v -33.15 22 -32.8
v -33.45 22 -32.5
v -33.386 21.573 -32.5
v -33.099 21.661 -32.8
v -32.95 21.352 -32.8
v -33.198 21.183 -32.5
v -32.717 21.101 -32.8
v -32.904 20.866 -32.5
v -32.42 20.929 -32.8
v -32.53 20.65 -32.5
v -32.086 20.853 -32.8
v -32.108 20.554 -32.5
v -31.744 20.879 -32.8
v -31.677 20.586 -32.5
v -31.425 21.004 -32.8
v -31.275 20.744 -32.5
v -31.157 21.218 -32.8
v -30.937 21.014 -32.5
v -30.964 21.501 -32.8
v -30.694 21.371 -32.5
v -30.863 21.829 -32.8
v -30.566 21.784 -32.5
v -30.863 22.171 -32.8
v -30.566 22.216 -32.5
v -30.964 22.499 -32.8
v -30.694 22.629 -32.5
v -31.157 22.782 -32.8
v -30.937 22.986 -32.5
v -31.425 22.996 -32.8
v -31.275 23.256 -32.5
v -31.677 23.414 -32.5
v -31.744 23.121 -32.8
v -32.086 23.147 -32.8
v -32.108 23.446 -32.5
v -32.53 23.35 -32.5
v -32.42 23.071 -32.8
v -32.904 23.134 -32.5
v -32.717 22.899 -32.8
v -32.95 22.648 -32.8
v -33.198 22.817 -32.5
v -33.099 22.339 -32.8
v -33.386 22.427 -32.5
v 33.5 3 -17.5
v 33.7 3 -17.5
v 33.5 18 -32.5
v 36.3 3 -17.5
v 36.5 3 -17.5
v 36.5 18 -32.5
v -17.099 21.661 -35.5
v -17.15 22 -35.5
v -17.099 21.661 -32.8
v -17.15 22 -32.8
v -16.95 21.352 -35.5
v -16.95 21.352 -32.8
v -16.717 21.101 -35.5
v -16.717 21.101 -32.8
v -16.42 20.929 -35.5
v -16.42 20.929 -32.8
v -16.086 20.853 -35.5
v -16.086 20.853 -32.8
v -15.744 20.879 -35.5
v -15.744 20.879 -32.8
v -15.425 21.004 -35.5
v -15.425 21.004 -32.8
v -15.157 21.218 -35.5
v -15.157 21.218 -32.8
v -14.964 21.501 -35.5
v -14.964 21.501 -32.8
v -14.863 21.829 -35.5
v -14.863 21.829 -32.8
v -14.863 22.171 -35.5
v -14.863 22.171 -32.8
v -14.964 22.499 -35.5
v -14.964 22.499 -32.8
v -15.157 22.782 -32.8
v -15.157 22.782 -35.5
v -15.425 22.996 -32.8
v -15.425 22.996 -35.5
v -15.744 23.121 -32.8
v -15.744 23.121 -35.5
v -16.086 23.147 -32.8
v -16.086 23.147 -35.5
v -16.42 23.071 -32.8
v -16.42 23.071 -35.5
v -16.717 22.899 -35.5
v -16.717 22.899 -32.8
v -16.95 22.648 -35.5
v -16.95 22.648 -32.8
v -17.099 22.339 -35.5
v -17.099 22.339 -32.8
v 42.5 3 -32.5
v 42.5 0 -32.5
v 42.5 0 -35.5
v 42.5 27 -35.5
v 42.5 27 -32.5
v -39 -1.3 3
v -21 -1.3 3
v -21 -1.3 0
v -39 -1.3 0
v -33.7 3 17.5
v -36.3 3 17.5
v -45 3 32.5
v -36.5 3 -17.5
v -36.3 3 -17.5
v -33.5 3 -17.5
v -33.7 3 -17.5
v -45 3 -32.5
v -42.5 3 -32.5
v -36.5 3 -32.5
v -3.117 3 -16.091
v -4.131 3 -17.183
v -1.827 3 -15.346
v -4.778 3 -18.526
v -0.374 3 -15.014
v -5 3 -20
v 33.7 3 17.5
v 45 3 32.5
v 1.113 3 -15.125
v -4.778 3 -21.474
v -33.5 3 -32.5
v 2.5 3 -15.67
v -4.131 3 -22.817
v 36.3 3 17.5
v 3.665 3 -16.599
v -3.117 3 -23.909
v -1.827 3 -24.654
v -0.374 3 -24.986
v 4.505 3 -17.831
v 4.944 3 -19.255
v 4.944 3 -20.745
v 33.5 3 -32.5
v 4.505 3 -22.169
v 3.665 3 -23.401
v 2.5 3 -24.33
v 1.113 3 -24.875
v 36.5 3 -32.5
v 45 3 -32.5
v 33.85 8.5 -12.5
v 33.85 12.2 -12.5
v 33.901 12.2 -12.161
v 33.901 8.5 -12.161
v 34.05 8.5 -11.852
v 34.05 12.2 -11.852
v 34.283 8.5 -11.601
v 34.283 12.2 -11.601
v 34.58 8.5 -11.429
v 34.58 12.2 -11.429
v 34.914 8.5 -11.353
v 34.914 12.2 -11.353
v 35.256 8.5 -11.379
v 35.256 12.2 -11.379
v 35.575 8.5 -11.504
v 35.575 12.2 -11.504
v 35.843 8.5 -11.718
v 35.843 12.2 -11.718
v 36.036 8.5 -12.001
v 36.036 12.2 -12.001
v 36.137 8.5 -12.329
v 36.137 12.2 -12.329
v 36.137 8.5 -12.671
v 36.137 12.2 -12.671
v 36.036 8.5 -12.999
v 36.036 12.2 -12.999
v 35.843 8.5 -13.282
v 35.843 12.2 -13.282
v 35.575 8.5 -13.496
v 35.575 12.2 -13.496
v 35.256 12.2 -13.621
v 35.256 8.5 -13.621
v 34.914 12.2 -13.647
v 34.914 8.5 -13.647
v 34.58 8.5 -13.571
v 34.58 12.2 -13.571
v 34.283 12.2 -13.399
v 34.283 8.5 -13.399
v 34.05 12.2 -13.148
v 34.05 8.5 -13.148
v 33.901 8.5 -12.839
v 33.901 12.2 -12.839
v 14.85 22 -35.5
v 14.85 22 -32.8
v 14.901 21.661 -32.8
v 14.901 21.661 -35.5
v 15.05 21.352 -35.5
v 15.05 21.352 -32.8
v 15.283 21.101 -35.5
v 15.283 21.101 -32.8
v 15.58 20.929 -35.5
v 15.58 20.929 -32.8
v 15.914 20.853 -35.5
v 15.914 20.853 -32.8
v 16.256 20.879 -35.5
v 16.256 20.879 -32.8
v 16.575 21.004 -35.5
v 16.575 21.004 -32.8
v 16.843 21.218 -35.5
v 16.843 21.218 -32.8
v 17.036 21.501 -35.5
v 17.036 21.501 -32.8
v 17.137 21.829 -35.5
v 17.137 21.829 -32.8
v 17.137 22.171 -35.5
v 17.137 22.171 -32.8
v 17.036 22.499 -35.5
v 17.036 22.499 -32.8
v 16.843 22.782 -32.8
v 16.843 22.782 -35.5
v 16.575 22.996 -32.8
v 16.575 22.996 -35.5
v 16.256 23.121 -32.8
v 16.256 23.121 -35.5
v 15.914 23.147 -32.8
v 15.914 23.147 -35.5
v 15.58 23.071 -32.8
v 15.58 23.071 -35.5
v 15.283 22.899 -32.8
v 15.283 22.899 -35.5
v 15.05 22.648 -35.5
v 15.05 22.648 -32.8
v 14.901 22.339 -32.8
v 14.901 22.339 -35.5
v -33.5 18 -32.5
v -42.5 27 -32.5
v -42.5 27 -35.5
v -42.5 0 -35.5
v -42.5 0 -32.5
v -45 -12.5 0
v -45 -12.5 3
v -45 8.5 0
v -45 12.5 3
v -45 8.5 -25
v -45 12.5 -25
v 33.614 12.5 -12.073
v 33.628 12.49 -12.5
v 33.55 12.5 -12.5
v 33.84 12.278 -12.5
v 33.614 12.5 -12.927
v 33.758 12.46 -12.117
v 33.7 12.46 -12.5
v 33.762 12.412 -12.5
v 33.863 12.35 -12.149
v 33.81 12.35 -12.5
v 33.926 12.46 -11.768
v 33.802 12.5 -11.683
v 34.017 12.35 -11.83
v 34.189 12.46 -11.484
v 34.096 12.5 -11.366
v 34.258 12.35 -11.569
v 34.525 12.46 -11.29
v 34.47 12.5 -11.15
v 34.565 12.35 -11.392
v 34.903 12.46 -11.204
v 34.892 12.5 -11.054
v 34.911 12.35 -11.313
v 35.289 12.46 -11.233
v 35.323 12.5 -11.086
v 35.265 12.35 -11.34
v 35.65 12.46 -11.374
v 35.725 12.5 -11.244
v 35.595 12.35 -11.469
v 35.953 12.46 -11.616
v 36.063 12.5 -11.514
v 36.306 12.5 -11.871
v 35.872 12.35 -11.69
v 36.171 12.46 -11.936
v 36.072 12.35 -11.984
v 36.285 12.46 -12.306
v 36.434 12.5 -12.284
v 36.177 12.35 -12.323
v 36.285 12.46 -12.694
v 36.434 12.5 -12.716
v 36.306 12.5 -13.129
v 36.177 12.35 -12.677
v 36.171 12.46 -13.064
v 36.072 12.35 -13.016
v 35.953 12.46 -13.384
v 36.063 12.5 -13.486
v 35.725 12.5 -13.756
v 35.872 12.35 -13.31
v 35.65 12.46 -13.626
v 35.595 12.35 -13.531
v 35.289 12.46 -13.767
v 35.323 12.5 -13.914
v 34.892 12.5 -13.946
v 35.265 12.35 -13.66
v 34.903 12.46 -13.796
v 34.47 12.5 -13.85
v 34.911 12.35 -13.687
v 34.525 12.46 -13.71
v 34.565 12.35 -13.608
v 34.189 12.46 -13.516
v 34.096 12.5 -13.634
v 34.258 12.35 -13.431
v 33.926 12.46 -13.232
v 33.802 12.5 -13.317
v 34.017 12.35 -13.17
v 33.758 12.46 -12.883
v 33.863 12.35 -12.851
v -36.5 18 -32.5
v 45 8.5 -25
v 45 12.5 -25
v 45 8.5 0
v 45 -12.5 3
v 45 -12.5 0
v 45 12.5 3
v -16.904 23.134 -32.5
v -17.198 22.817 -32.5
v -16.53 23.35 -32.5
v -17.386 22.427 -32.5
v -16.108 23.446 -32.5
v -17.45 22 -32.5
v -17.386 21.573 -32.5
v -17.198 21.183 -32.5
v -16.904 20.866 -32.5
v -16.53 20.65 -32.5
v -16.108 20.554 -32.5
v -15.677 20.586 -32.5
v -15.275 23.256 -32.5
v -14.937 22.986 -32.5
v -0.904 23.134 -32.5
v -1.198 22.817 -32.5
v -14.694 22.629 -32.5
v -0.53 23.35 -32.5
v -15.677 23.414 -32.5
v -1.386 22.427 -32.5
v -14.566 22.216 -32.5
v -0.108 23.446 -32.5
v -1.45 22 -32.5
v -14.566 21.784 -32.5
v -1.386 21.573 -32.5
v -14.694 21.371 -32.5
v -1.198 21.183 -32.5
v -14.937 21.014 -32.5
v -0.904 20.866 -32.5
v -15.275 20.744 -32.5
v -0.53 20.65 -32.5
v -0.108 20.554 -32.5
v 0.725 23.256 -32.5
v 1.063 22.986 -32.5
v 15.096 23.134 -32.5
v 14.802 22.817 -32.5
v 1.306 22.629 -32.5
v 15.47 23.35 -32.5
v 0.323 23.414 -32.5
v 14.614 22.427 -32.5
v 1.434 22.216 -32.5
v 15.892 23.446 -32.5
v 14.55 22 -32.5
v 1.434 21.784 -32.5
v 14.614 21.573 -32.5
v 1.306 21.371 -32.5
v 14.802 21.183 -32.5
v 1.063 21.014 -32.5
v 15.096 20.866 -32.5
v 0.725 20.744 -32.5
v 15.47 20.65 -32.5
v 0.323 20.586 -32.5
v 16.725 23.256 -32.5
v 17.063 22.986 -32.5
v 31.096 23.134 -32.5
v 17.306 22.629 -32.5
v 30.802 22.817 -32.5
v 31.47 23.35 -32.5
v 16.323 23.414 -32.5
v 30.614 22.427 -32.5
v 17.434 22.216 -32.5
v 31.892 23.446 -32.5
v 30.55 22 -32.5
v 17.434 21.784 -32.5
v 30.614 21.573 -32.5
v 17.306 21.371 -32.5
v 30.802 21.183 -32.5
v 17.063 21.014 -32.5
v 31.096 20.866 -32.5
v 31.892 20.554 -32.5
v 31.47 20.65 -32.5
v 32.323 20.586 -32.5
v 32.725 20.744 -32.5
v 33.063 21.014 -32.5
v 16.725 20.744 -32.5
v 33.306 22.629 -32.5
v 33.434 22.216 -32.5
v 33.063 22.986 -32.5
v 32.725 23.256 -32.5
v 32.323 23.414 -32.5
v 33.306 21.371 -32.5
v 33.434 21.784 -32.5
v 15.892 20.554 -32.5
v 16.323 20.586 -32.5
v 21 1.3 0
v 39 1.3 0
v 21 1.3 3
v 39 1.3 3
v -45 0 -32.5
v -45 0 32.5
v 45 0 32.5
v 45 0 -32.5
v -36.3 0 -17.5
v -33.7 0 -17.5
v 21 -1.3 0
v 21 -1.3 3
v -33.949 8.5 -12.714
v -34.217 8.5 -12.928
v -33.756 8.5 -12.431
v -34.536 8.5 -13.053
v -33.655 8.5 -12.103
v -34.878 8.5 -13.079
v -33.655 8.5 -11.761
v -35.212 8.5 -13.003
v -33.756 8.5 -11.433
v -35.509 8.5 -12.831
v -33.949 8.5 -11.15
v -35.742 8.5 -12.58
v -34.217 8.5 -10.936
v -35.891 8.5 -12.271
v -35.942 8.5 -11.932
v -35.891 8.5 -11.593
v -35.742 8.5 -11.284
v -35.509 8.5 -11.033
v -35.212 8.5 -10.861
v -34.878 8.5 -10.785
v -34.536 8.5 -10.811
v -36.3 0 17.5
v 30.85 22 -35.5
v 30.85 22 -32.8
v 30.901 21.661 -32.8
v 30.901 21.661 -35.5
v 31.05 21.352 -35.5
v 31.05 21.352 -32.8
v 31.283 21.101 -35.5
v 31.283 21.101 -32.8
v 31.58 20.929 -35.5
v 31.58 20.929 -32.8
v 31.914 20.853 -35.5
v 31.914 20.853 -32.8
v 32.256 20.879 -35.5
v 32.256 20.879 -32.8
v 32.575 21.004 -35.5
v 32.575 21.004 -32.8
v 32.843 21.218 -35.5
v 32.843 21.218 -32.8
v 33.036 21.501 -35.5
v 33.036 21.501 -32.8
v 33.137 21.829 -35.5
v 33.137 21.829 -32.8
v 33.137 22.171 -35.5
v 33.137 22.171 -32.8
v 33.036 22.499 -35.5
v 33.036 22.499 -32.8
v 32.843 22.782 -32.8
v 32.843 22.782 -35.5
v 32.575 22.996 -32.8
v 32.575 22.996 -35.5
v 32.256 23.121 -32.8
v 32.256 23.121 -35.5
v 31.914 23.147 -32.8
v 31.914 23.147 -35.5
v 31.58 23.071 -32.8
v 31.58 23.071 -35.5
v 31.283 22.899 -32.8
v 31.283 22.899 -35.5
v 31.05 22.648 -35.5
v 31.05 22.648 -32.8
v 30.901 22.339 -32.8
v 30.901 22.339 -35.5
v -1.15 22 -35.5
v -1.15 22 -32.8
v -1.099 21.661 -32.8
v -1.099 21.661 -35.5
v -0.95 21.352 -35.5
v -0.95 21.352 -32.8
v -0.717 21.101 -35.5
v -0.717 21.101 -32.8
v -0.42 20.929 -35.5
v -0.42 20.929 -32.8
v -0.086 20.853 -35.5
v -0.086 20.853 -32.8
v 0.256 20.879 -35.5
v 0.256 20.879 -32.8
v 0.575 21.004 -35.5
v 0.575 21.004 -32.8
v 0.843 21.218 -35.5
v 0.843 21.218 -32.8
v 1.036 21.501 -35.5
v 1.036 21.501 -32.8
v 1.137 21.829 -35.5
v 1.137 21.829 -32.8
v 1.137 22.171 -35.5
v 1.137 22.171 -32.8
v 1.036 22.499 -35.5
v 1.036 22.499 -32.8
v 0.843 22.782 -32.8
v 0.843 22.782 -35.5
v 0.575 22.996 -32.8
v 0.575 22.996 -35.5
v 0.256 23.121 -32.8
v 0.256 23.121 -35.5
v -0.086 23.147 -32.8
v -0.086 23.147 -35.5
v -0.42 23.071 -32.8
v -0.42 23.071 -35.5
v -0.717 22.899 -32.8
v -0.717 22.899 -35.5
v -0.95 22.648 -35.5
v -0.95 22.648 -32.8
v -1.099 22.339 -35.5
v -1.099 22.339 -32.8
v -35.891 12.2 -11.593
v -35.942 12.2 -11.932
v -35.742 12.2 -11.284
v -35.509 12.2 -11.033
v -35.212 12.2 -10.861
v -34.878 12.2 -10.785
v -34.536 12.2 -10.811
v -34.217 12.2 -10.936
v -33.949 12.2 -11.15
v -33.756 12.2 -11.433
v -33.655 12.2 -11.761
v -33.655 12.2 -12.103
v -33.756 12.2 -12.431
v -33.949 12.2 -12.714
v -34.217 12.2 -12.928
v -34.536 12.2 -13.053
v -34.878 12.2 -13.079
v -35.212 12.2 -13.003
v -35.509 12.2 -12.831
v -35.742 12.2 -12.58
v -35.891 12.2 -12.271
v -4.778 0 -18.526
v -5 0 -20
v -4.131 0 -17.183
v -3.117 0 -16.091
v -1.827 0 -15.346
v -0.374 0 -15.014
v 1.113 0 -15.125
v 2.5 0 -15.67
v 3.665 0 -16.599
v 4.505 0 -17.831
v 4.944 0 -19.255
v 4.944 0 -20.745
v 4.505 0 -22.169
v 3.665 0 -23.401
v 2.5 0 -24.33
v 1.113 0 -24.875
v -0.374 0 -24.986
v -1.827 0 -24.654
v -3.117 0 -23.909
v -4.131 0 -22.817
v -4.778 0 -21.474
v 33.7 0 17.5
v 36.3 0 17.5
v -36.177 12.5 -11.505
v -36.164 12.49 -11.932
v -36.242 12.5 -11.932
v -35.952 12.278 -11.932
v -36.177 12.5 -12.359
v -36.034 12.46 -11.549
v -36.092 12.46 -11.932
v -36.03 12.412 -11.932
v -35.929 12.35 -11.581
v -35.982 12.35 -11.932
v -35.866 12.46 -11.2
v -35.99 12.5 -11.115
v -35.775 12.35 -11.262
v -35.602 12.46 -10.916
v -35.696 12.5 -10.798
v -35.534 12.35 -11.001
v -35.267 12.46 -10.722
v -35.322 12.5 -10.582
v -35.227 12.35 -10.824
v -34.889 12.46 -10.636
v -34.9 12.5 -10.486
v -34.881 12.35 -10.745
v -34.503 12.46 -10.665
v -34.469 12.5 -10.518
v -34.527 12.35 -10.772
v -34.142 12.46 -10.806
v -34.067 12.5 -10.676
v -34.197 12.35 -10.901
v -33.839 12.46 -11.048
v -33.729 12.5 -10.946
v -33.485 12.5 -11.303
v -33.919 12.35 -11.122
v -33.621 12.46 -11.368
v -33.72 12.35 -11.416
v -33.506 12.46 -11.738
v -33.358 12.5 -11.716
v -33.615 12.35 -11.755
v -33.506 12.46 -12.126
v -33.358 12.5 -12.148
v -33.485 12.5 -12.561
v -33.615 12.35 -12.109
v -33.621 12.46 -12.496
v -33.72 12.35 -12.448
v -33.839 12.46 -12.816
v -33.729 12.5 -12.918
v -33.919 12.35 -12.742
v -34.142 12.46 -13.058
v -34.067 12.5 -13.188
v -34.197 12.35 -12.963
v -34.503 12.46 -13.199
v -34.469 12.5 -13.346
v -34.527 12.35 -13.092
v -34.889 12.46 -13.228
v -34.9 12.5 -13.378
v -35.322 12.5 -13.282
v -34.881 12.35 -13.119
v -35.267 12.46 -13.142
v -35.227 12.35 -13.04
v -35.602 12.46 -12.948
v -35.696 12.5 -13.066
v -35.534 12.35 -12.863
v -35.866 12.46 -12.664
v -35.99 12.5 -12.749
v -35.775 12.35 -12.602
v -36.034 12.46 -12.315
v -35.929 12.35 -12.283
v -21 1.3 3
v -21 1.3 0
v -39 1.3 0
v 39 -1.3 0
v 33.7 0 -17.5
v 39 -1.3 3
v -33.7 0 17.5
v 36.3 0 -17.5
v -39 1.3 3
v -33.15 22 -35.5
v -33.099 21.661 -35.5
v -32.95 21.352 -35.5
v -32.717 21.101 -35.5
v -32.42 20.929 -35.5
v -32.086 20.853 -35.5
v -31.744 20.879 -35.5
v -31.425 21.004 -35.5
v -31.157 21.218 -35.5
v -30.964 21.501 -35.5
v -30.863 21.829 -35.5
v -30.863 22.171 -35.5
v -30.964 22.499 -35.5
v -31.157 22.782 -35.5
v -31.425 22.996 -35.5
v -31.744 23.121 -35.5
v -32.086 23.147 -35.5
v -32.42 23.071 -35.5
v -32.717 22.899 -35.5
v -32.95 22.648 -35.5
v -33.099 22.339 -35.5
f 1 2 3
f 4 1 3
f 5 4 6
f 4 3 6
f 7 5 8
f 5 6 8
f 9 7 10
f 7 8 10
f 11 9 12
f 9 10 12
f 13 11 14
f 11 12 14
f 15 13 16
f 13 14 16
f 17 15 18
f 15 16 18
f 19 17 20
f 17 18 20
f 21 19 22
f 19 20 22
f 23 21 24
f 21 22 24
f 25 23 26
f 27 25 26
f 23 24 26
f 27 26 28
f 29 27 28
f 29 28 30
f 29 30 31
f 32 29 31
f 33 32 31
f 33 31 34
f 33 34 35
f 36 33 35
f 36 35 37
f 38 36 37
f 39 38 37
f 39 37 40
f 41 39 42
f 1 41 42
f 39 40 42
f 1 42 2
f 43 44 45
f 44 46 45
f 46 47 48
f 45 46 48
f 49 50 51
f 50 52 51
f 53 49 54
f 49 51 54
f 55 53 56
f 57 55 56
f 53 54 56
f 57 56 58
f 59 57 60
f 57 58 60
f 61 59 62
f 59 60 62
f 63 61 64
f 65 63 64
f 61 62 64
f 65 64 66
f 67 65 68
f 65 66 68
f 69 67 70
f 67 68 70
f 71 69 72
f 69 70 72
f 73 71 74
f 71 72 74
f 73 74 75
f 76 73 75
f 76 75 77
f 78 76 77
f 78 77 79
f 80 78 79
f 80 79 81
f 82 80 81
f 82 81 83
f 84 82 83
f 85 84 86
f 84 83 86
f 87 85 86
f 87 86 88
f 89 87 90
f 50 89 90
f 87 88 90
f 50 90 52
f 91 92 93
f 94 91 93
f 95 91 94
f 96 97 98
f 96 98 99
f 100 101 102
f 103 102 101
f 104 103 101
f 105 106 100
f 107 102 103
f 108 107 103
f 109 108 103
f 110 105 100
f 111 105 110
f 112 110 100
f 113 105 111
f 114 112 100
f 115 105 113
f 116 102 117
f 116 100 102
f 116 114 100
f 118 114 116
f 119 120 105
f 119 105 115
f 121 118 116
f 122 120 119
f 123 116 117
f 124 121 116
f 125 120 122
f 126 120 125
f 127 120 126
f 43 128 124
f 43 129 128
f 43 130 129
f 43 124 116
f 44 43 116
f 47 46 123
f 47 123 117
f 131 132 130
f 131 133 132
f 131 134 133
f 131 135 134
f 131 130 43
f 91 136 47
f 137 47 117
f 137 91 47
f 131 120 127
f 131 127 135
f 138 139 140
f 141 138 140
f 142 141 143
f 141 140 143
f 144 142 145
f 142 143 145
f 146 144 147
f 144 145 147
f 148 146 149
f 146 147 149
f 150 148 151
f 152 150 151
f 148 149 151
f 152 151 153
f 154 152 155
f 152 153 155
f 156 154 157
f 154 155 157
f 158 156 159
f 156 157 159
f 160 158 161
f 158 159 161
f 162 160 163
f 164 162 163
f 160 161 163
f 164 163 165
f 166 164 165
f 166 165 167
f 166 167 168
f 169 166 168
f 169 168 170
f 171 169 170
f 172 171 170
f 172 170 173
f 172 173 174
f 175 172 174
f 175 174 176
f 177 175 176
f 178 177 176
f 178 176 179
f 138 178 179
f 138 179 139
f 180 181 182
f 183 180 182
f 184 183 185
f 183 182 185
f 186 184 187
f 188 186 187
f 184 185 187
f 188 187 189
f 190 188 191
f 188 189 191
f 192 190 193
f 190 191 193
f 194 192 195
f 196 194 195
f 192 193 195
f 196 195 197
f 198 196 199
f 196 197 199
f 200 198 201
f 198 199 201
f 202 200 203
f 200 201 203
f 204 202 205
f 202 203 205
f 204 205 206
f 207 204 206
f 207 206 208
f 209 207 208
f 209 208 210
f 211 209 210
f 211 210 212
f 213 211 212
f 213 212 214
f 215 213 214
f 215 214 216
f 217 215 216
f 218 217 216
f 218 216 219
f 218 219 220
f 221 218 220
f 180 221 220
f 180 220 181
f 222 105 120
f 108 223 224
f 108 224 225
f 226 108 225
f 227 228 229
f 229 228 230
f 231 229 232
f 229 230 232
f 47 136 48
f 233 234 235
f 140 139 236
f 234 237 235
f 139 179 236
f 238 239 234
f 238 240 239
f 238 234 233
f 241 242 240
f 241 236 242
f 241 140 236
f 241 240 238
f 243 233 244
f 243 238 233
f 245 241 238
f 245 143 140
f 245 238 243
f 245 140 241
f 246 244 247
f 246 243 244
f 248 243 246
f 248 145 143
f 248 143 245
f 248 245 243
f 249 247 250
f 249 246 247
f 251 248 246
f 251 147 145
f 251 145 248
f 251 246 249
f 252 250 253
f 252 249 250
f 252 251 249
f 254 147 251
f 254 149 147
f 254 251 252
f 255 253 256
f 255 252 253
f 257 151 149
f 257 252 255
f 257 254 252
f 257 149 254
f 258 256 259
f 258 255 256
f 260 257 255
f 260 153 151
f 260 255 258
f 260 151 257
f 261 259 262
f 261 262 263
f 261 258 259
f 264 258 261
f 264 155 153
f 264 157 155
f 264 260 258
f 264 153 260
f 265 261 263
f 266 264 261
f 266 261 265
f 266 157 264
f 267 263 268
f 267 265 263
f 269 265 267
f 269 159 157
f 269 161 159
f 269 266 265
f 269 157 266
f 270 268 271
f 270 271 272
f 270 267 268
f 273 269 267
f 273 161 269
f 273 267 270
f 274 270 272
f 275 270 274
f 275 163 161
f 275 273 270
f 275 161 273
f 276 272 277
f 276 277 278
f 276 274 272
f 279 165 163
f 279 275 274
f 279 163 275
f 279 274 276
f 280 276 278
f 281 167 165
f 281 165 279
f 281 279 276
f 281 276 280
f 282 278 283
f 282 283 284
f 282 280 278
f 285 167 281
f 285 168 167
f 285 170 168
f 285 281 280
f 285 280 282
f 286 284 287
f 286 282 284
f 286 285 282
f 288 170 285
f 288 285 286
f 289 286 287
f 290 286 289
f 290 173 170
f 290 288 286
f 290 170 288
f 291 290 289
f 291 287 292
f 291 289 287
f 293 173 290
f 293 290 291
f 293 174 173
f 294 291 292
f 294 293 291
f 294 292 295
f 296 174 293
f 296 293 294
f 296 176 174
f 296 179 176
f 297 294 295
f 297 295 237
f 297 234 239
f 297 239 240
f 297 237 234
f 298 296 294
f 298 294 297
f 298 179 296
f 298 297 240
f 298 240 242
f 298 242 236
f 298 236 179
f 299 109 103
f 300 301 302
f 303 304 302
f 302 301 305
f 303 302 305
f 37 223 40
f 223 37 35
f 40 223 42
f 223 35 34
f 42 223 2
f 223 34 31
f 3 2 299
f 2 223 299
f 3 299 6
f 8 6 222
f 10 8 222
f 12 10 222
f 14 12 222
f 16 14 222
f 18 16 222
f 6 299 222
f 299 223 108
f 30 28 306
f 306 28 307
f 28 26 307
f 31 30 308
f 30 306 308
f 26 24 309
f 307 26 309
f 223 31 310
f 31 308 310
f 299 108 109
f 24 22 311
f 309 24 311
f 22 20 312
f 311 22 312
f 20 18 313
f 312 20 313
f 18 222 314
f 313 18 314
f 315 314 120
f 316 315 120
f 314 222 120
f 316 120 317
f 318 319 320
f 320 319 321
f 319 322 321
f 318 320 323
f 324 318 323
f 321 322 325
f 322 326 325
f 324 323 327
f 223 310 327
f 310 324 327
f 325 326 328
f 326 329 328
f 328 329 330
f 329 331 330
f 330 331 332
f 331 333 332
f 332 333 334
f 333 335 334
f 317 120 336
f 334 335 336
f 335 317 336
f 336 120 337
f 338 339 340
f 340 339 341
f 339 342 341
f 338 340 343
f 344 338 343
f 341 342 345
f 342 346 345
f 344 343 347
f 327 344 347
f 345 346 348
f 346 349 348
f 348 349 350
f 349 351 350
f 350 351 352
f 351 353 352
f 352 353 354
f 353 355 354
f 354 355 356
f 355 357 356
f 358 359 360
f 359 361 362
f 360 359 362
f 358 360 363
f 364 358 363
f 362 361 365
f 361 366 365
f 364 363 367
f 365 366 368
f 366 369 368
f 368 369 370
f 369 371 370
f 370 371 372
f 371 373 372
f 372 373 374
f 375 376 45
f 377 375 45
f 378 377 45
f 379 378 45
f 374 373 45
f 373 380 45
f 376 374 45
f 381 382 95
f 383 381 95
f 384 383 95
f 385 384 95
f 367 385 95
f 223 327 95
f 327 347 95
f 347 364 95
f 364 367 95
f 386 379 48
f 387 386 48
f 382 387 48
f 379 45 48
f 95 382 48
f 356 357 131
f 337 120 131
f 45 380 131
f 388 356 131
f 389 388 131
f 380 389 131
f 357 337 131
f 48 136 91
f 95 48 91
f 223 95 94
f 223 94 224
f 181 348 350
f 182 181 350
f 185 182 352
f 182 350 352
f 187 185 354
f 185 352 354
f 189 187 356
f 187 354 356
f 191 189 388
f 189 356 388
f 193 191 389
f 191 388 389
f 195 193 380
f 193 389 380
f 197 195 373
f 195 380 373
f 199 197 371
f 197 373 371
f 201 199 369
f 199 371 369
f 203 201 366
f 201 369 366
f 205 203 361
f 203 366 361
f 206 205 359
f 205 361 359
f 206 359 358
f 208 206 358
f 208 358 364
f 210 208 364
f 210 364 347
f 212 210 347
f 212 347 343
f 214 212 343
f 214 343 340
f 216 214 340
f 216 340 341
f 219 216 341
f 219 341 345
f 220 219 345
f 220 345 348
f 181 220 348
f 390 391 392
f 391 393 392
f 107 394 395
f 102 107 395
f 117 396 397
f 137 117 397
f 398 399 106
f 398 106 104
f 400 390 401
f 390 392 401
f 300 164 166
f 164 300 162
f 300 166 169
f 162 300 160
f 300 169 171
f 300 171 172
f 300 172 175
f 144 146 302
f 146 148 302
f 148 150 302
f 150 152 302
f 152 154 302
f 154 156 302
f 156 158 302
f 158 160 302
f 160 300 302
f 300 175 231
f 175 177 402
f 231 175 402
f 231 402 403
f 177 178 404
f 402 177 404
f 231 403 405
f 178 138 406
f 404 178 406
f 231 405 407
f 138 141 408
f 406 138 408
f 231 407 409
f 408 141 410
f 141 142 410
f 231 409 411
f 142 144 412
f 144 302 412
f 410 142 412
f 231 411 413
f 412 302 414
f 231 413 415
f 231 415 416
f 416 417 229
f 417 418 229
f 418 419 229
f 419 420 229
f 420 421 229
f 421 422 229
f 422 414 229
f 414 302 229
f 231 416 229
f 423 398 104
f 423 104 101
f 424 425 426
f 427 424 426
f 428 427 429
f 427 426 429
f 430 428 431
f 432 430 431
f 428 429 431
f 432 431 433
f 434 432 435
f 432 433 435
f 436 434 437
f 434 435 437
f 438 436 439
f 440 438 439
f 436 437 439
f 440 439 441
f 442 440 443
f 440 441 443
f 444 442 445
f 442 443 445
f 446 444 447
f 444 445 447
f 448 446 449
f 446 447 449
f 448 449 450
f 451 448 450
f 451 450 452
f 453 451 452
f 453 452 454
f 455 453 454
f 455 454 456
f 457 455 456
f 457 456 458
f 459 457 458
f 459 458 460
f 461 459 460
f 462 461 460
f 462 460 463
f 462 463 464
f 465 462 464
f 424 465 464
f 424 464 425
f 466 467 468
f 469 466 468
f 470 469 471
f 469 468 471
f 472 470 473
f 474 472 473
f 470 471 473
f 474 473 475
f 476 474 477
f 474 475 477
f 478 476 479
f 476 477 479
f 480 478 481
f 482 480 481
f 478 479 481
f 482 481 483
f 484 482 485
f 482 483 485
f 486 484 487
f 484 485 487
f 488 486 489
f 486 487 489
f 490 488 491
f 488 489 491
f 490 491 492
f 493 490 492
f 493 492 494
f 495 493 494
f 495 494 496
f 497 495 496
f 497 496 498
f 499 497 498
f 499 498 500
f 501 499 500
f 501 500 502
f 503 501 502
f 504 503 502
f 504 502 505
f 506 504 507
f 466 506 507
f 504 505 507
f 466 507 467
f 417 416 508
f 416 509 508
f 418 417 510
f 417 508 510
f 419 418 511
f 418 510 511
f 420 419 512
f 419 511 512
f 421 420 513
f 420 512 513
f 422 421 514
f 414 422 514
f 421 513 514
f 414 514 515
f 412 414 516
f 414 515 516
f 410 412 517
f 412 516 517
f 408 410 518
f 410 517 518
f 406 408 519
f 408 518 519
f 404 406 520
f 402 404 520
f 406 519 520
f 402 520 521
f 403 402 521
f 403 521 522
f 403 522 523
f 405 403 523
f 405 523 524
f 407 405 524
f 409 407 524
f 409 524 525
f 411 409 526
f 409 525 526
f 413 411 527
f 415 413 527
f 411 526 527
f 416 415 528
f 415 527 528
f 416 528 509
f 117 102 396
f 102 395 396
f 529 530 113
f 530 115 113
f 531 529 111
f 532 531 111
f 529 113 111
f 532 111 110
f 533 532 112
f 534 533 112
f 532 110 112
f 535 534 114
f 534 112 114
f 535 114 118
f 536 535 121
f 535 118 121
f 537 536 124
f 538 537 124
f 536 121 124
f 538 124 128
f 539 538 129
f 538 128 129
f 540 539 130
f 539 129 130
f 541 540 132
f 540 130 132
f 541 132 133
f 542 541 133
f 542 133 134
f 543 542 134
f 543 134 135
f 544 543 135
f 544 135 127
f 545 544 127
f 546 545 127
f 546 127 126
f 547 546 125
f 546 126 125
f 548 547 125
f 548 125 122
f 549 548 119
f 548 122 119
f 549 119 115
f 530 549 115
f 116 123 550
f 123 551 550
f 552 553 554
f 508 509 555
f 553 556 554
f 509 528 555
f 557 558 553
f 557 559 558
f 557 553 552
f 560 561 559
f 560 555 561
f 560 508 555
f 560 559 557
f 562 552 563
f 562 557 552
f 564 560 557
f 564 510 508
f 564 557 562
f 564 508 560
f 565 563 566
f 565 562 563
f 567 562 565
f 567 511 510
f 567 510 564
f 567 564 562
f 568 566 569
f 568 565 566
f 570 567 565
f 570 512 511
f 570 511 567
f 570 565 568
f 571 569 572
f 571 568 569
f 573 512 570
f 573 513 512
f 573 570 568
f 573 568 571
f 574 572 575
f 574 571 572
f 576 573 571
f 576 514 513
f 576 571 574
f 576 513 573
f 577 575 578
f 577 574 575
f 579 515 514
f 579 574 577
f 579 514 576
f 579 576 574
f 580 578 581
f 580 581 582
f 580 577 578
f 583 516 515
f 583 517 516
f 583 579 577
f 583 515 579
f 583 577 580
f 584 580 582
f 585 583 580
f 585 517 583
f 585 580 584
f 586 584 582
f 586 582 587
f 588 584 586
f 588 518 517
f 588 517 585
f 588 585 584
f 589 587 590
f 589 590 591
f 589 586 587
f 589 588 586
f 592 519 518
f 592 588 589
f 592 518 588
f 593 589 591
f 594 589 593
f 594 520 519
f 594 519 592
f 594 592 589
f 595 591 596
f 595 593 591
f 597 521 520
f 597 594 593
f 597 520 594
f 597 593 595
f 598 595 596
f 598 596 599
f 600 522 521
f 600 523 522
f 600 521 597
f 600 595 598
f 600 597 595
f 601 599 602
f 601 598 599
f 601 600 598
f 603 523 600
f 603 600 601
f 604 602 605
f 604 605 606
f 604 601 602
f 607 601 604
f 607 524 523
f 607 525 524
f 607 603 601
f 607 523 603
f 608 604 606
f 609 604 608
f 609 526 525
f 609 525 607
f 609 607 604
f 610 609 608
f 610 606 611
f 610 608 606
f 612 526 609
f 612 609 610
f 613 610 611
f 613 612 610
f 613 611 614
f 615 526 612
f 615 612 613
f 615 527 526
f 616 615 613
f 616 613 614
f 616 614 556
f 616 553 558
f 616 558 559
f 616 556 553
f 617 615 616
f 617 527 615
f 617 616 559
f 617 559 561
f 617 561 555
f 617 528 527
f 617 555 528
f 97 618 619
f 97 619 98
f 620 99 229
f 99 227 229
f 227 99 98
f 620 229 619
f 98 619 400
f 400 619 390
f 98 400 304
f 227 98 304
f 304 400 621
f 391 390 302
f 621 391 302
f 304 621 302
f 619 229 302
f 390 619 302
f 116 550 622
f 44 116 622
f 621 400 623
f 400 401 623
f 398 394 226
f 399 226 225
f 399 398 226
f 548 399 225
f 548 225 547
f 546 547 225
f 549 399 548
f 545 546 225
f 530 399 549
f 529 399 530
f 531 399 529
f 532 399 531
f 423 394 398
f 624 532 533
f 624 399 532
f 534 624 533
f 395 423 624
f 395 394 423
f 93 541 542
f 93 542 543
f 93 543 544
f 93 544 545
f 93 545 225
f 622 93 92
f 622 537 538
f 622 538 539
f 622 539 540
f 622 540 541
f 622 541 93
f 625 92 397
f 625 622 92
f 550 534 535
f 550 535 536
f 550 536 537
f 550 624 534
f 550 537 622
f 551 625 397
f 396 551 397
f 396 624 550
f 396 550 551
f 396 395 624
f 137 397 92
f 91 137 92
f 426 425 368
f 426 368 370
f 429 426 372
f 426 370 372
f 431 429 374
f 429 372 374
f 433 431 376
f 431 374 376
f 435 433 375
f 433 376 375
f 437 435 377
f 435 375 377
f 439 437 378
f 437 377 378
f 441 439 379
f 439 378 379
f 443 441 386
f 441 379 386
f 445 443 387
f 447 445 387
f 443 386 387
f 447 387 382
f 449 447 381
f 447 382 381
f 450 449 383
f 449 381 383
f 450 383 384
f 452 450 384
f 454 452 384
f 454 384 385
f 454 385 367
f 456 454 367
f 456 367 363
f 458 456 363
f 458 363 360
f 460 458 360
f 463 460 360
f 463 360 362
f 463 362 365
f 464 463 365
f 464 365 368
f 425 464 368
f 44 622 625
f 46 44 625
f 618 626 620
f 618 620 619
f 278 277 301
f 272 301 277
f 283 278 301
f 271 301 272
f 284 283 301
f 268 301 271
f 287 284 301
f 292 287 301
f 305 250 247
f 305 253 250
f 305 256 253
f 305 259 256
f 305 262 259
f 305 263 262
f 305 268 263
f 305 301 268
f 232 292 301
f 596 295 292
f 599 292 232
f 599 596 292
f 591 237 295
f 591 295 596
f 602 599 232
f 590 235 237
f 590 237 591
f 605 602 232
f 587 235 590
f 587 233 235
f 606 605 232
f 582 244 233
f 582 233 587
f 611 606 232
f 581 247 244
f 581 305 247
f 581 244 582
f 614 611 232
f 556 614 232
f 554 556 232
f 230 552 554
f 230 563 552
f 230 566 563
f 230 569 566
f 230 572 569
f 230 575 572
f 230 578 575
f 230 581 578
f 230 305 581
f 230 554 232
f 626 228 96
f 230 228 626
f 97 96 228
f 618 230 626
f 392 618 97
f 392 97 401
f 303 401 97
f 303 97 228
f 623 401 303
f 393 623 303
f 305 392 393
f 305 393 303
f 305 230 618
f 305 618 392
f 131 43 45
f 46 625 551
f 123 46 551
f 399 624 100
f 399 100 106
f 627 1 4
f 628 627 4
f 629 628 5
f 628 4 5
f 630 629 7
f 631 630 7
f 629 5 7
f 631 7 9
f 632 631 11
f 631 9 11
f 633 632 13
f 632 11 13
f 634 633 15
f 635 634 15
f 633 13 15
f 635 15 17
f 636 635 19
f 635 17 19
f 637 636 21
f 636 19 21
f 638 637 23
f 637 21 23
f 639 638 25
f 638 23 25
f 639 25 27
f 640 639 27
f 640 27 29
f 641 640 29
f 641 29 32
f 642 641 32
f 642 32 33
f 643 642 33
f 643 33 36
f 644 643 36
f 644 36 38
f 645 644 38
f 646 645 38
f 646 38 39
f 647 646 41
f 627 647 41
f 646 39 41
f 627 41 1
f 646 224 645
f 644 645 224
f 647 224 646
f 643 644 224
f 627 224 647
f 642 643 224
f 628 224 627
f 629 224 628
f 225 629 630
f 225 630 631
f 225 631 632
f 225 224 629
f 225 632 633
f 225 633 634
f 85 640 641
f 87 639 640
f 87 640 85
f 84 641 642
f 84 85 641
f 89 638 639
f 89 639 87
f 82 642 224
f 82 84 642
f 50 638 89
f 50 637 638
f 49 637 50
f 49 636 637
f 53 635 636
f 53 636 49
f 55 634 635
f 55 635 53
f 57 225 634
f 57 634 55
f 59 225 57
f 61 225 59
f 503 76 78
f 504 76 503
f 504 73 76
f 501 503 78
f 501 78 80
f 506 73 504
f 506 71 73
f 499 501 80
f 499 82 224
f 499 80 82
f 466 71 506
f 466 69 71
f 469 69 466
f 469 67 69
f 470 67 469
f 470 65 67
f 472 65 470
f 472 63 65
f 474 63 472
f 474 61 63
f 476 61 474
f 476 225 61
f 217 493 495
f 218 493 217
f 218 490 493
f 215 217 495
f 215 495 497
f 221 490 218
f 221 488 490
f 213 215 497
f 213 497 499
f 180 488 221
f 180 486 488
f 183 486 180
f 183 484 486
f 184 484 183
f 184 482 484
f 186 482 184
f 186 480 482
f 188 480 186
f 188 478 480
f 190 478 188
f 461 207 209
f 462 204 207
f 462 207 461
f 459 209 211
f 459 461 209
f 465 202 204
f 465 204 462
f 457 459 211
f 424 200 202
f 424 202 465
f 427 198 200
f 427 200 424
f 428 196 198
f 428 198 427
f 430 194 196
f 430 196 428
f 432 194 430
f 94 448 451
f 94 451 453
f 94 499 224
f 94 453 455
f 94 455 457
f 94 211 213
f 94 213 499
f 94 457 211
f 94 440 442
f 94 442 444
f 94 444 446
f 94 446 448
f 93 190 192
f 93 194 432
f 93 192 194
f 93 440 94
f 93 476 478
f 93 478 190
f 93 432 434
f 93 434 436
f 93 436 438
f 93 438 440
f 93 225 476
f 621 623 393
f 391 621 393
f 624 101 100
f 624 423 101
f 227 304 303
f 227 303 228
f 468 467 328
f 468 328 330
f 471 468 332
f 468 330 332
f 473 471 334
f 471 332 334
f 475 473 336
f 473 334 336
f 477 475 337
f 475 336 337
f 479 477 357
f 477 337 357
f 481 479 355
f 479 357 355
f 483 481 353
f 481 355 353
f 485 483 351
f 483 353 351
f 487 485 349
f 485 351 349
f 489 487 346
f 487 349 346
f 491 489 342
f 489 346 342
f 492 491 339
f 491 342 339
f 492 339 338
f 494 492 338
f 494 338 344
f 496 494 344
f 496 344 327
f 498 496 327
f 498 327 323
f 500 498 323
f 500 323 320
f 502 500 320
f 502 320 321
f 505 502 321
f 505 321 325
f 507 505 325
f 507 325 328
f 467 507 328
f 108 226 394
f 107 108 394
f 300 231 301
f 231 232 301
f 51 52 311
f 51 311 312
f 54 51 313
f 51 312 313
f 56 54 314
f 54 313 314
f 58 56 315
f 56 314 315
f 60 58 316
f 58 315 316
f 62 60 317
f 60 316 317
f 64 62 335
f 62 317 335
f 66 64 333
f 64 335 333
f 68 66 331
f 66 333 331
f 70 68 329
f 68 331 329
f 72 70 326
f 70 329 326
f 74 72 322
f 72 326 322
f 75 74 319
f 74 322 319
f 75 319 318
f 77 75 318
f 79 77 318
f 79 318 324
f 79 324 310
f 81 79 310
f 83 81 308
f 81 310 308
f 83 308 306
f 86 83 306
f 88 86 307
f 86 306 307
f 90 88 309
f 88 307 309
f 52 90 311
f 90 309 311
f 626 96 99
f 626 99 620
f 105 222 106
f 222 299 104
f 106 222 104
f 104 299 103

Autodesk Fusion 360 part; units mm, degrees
sketch "Sketch1" plane through (0, 0, 0) normal (0, 0, 1) x (1, 0, 0) in component "TCRT_Chassis_Adapter"
  line L0 (-45, 12.5) -> (45, 12.5)
  line L1 (45, 12.5) -> (45, -12.5)
  line L2 (45, -12.5) -> (-45, -12.5)
  line L3 (-45, -12.5) -> (-45, 12.5)
  line L4 (-45, 12.5) -> (45, -12.5) construction
  line L5 (45, 12.5) -> (-45, -12.5) construction
  dimension "d18" = 90
  dimension "d19" = 25
extrude "Extrude1" add sketch "Sketch1" along normal blind 3 makes body 1 in component "TCRT_Chassis_Adapter"
sketch "Sketch2" plane through (0, 0, 3) normal (0, 0, 1) x (-1, 0, 0) in component "TCRT_Chassis_Adapter"
  line L0 (45, 12.5) -> (-45, 12.5)
  line L1 (-45, 12.5) -> (-45, -12.5)
  line L2 (-45, -12.5) -> (45, -12.5)
  line L3 (45, -12.5) -> (45, 12.5)
  line L4 (21, 1.3) -> (39, 1.3)
  line L5 (39, 1.3) -> (39, -1.3)
  line L6 (39, -1.3) -> (21, -1.3)
  line L7 (21, -1.3) -> (21, 1.3)
  line L8 (21, 1.3) -> (39, -1.3) construction
  line L9 (39, 1.3) -> (21, -1.3) construction
  line L10 (0, -12.5) -> (0, 12.5)
  line L11 (-39, -1.3) -> (-21, -1.3)
  line L12 (-39, 1.3) -> (-21, -1.3) construction
  line L13 (-21, -1.3) -> (-21, 1.3)
  line L14 (-21, 1.3) -> (-39, -1.3) construction
  line L15 (-21, 1.3) -> (-39, 1.3)
  line L16 (-39, 1.3) -> (-39, -1.3)
  point P0 (30, 0)
  point P1 (-30, 0)
  dimension "d22" = 18
  dimension "d23" = 30
  dimension "d24" = 2.6
extrude "Extrude2" cut sketch "Sketch2" against normal blind 8 contours L4 L5 L6 L7 | L11 L13 L15 L16 bodies 1 in component "TCRT_Chassis_Adapter"
sketch "Sketch3" plane through (0, 12.5, 0) normal (0, 1, 0) x (-1, 0, 0) in component "TCRT_Chassis_Adapter"
  line L0 (-45, 0) -> (45, 0)
  line L1 (45, 0) -> (45, 3)
  line L2 (45, 3) -> (-45, 3)
  line L3 (-45, 3) -> (-45, 0)
  line L4 (-45, 0) -> (45, 0)
  line L5 (45, 0) -> (45, -25)
  line L6 (45, -25) -> (-45, -25)
  line L7 (-45, -25) -> (-45, 0)
extrude "Extrude3" add sketch "Sketch3" against normal blind 4 contours L0 L4 L5 L6 L7 bodies 1 in component "TCRT_Chassis_Adapter"
sketch "Sketch4" plane through (0, 12.5, 0) normal (0, 1, 0) x (-1, 0, 0) in component "TCRT_Chassis_Adapter"
  line L0 (45, -25) -> (45, 3)
  line L1 (45, 3) -> (-45, 3)
  line L2 (-45, 3) -> (-45, -25)
  line L3 (-45, -25) -> (45, -25)
  circle A0 centre (-35, -12.5) radius 1.15
  line L4 (-0.2279, 3) -> (0, -25)
  circle A1 centre (34.7919, -11.932) radius 1.15
  dimension "d29" = 2.3
  dimension "d31" = 15.5
sketch "Sketch1 (2)" plane through (0, 0, 0) normal (0, 1, 0) x (1, 0, 0) in component "TCRT_Sensor_Slider"
  line L0 (45, 32.5) -> (-45, 32.5)
  line L1 (-45, 32.5) -> (-45, -32.5)
  line L2 (-45, -32.5) -> (45, -32.5)
  line L3 (45, -32.5) -> (45, 32.5)
  line L4 (45, 32.5) -> (-45, -32.5) construction
  line L5 (-45, 32.5) -> (45, -32.5) construction
  dimension "d41" = 65
  dimension "d42" = 90
extrude "Extrude1'" add sketch "Sketch1 (2)" along normal blind 3 separate body makes body 2 in component "TCRT_Sensor_Slider"
sketch "Sketch2 (2)" plane through (0, 0, 0) normal (0, -1, 0) x (1, 0, 0) in component "TCRT_Sensor_Slider"
  line L0 (45, -32.5) -> (45, 32.5)
  line L1 (45, 32.5) -> (-45, 32.5)
  line L2 (-45, 32.5) -> (-45, -32.5)
  line L3 (-45, -32.5) -> (45, -32.5)
  line L4 (0, 32.5) -> (0, -32.5)
  line L5 (-33.7, -17.5001) -> (-36.3, -17.5001)
  line L6 (-36.3, -17.5001) -> (-36.3, 17.4999)
  line L7 (-36.3, 17.4999) -> (-33.7, 17.4999)
  line L8 (-33.7, 17.4999) -> (-33.7, -17.5001)
  line L9 (-33.7, -17.5001) -> (-36.3, 17.4999) construction
  line L10 (-36.3, -17.5001) -> (-33.7, 17.4999) construction
  line L11 (36.3, -17.5001) -> (33.7, 17.4999) construction
  line L12 (33.7, 17.4999) -> (33.7, -17.5001)
  line L13 (33.7, -17.5001) -> (36.3, -17.5001)
  line L14 (36.3, 17.4999) -> (33.7, 17.4999)
  line L15 (33.7, -17.5001) -> (36.3, 17.4999) construction
  line L16 (36.3, -17.5001) -> (36.3, 17.4999)
  point P0 (-35, -0.0001)
  point P1 (35, -0.0001)
  dimension "d45" = 35
  dimension "d46" = 2.6
  dimension "d47" = 35
extrude "Extrude2'" cut sketch "Sketch2 (2)" against normal blind 3 contours L5 L6 L7 L8 | L12 L13 L14 L16 bodies 2 in component "TCRT_Sensor_Slider"
sketch "Sketch3 (2)" plane through (0, 0, 0) normal (1, 0, 0) x (0, 1, 0) in component "TCRT_Sensor_Slider"
sketch "Sketch4 (2)" plane through (0, 0, -32.5) normal (0, 0, -1) x (1, 0, 0) in component "TCRT_Sensor_Slider"
  line L0 (45, 0) -> (-45, 0)
  line L1 (-45, 0) -> (-45, -3)
  line L2 (-45, -3) -> (45, -3)
  line L3 (45, -3) -> (45, 0)
sketch "Sketch5" plane through (0, 0, -32.5) normal (0, 0, -1) x (1, 0, 0) in component "TCRT_Sensor_Slider"
  line L0 (-42.5, 0) -> (42.5, 0)
  line L1 (42.5, 0) -> (42.5, -27)
  line L2 (42.5, -27) -> (-42.5, -27)
  line L3 (-42.5, -27) -> (-42.5, 0)
  dimension "d50" = 42.5
  dimension "d51" = 42.5
  dimension "d52" = 27
extrude "Extrude3'" add sketch "Sketch5" along normal blind 3 bodies 2 in component "TCRT_Sensor_Slider"
sketch "Sketch6" plane through (0, 3, 0) normal (0, 1, 0) x (-1, 0, 0) in component "TCRT_Sensor_Slider"
  line L0 (36.3, 17.4999) -> (36.3, -17.5001)
  line L1 (36.3, -17.5001) -> (33.7, -17.5001)
  line L2 (33.7, -17.5001) -> (33.7, 17.4999)
  line L3 (33.7, 17.4999) -> (36.3, 17.4999)
  line L4 (-36.3, 17.4999) -> (-33.7, 17.4999)
  line L5 (-33.7, 17.4999) -> (-33.7, -17.5001)
  line L6 (-33.7, -17.5001) -> (-36.3, -17.5001)
  line L7 (-36.3, -17.5001) -> (-36.3, 17.4999)
  line L8 (-45, 32.5) -> (-45, -32.5)
  line L9 (-45, -32.5) -> (-42.5, -32.5)
  line L10 (-42.5, -32.5) -> (42.5, -32.5)
  line L11 (42.5, -32.5) -> (45, -32.5)
  line L12 (45, -32.5) -> (45, 32.5)
  line L13 (45, 32.5) -> (-45, 32.5)
sketch "Sketch7" plane through (0, 3, 0) normal (0, 1, 0) x (-1, 0, 0) in component "TCRT_Sensor_Slider"
  line L0 (-33.5, -32.5) -> (-36.5, -32.5)
  line L1 (-36.5, -32.5) -> (-36.5, -17.5)
  line L2 (-36.5, -17.5) -> (-33.5, -17.5)
  line L3 (-33.5, -17.5) -> (-33.5, -32.5)
  line L4 (-33.5, -32.5) -> (-36.5, -17.5) construction
  line L5 (-36.5, -32.5) -> (-33.5, -17.5) construction
  line L6 (0, 32.5) -> (0, -32.5)
  line L7 (36.5, -17.5) -> (33.5, -17.5)
  line L8 (36.5, -32.5) -> (33.5, -17.5) construction
  line L9 (36.5, -32.5) -> (36.5, -17.5)
  line L10 (33.5, -32.5) -> (36.5, -17.5) construction
  line L11 (33.5, -17.5) -> (33.5, -32.5)
  line L12 (33.5, -32.5) -> (36.5, -32.5)
  point P0 (-35, -25)
  dimension "d57" = 3
  dimension "d58" = 15
extrude "Extrude4" add sketch "Sketch7" along normal blind 15 bodies 2 in component "TCRT_Sensor_Slider"
sketch "Sketch8" plane through (36.5, 0, 0) normal (1, 0, 0) x (0, 1, 0) in component "TCRT_Sensor_Slider"
  line L0 (3, -17.5) -> (3, -32.5)
  line L1 (3, -32.5) -> (18, -32.5)
  line L2 (18, -32.5) -> (18, -17.5)
  line L3 (18, -17.5) -> (3, -17.5)
  line L4 (3, -17.5) -> (18, -32.5)
  line L5 (3, -17.5) -> (18, -17.5)
  line L6 (18, -32.5) -> (18, -17.5)
extrude "Extrude5" cut sketch "Sketch8" against normal blind 3 contours L2 L3 L4 L5 L6 bodies 2 in component "TCRT_Sensor_Slider"
sketch "Sketch9" plane through (-33.5, 0, 0) normal (1, 0, 0) x (0, 1, 0) in component "TCRT_Sensor_Slider"
  line L0 (3, -17.5) -> (3, -32.5)
  line L1 (3, -32.5) -> (18, -32.5)
  line L2 (18, -32.5) -> (18, -17.5)
  line L3 (18, -17.5) -> (3, -17.5)
sketch "Sketch10" plane through (-36.5, 0, 0) normal (-1, 0, 0) x (0, -1, 0) in component "TCRT_Sensor_Slider"
  line L0 (-3, -32.5) -> (-3, -17.5)
  line L1 (-3, -17.5) -> (-18, -17.5)
  line L2 (-18, -17.5) -> (-18, -32.5)
  line L3 (-18, -32.5) -> (-3, -32.5)
  line L4 (-18, -32.5) -> (-3, -17.5)
  line L5 (-3, -17.5) -> (-18, -17.5)
  line L6 (-18, -32.5) -> (-18, -17.5)
extrude "Extrude6" cut sketch "Sketch10" against normal blind 3 contours L1 L2 L4 L5 L6 bodies 2 in component "TCRT_Sensor_Slider"
extrude "Extrude5'" cut sketch "Sketch4" against normal blind 5 contours A0 bodies 1 in component "TCRT_Chassis_Adapter"
extrude "Extrude6'" cut sketch "Sketch4" against normal blind 5 contours A1 bodies 1 in component "TCRT_Chassis_Adapter"
fillet "Fillet2" radius 0.3 2 edges at (36.0722, 12.5, -12.0841) (-33.7197, 12.5, -11.5161) on bodies 1 in component "TCRT_Chassis_Adapter"
sketch "Sketch11" plane through (0, 0, -32.5) normal (0, 0, 1) x (-1, 0, 0) in component "TCRT_Sensor_Slider"
  line L0 (33.5, -18) -> (33.5, -3)
  line L1 (33.5, -3) -> (-33.5, -3)
  line L2 (-33.5, -3) -> (-33.5, -18)
  line L3 (-33.5, -18) -> (-36.5, -18)
  line L4 (-36.5, -18) -> (-36.5, -3)
  line L5 (-36.5, -3) -> (-42.5, -3)
  line L6 (-42.5, -3) -> (-42.5, -27)
  line L7 (-42.5, -27) -> (42.5, -27)
  line L8 (42.5, -27) -> (42.5, -3)
  line L9 (42.5, -3) -> (36.5, -3)
  line L10 (36.5, -3) -> (36.5, -18)
  line L11 (36.5, -18) -> (33.5, -18)
sketch "Sketch12" plane through (0, 0, -32.5) normal (0, 0, 1) x (-1, 0, 0) in component "TCRT_Sensor_Slider"
  circle A0 centre (0, -22) radius 1.15
  circle A1 centre (-16, -22) radius 1.15
  circle A2 centre (-32, -22) radius 1.15
  circle A3 centre (32, -22) radius 1.15
  circle A4 centre (16, -22) radius 1.15
  dimension "d71" = 2.3
  dimension "d72" = 2.3
  dimension "d73" = 16
  dimension "d74" = 2.3
  dimension "d75" = 16
extrude "Extrude7" cut sketch "Sketch12" against normal blind 5 bodies 2 in component "TCRT_Sensor_Slider"
sketch "Sketch13" plane through (0, 3, 0) normal (0, 1, 0) x (-1, 0, 0) in component "TCRT_Sensor_Slider"
  circle A0 centre (0, -20) radius 5
  dimension "d78" = 10
extrude "Extrude8" cut sketch "Sketch13" against normal blind 15 bodies 2 in component "TCRT_Sensor_Slider"
chamfer "Chamfer1" distance 0.3 angle 45 1 edges at (33.0722, 21.5841, -32.5) on bodies 2 in component "TCRT_Sensor_Slider"
chamfer "Chamfer2" distance 0.3 angle 45 1 edges at (17.0722, 21.5841, -32.5) on bodies 2 in component "TCRT_Sensor_Slider"
chamfer "Chamfer3" distance 0.3 angle 45 1 edges at (1.0722, 21.5841, -32.5) on bodies 2 in component "TCRT_Sensor_Slider"
chamfer "Chamfer4" distance 0.3 angle 45 1 edges at (-14.9278, 21.5841, -32.5) on bodies 2 in component "TCRT_Sensor_Slider"
chamfer "Chamfer5" distance 0.3 angle 45 1 edges at (-30.9278, 21.5841, -32.5) on bodies 2 in component "TCRT_Sensor_Slider"
component "TCRT_Chassis_Adapter" placed x (1, 0, 0) y (0, 1, 0) z (0, 0, 1) at (0, 0, 0)
component "TCRT_Sensor_Slider" placed x (1, 0, 0) y (0, 1, 0) z (0, 0, 1) at (0, 0, 0)
equation "adapter_width = 90 mm"
equation "adapter_depth = 25 mm"
equation "plate_thickness = 3 mm"
equation "front_wall_height = 25 mm"
equation "front_wall_thickness = 4 mm"
equation "slider_width = 90 mm"
equation "slider_height = 65 mm"
equation "slider_thickness = 3 mm"
equation "sensor_shelf_width = 85 mm"
equation "sensor_shelf_depth = 24 mm"
equation "sensor_shelf_thickness = 3 mm"
equation "vertical_slot_height = 35"
equation "slot_width = 4.2 mm"
equation "sensor_spacing = 13 mm"
equation "zip_slot_width = 3.5 mm"
equation "zip_slot_length = 10 mm"
equation "m3_clearance = 3.2 mm"
